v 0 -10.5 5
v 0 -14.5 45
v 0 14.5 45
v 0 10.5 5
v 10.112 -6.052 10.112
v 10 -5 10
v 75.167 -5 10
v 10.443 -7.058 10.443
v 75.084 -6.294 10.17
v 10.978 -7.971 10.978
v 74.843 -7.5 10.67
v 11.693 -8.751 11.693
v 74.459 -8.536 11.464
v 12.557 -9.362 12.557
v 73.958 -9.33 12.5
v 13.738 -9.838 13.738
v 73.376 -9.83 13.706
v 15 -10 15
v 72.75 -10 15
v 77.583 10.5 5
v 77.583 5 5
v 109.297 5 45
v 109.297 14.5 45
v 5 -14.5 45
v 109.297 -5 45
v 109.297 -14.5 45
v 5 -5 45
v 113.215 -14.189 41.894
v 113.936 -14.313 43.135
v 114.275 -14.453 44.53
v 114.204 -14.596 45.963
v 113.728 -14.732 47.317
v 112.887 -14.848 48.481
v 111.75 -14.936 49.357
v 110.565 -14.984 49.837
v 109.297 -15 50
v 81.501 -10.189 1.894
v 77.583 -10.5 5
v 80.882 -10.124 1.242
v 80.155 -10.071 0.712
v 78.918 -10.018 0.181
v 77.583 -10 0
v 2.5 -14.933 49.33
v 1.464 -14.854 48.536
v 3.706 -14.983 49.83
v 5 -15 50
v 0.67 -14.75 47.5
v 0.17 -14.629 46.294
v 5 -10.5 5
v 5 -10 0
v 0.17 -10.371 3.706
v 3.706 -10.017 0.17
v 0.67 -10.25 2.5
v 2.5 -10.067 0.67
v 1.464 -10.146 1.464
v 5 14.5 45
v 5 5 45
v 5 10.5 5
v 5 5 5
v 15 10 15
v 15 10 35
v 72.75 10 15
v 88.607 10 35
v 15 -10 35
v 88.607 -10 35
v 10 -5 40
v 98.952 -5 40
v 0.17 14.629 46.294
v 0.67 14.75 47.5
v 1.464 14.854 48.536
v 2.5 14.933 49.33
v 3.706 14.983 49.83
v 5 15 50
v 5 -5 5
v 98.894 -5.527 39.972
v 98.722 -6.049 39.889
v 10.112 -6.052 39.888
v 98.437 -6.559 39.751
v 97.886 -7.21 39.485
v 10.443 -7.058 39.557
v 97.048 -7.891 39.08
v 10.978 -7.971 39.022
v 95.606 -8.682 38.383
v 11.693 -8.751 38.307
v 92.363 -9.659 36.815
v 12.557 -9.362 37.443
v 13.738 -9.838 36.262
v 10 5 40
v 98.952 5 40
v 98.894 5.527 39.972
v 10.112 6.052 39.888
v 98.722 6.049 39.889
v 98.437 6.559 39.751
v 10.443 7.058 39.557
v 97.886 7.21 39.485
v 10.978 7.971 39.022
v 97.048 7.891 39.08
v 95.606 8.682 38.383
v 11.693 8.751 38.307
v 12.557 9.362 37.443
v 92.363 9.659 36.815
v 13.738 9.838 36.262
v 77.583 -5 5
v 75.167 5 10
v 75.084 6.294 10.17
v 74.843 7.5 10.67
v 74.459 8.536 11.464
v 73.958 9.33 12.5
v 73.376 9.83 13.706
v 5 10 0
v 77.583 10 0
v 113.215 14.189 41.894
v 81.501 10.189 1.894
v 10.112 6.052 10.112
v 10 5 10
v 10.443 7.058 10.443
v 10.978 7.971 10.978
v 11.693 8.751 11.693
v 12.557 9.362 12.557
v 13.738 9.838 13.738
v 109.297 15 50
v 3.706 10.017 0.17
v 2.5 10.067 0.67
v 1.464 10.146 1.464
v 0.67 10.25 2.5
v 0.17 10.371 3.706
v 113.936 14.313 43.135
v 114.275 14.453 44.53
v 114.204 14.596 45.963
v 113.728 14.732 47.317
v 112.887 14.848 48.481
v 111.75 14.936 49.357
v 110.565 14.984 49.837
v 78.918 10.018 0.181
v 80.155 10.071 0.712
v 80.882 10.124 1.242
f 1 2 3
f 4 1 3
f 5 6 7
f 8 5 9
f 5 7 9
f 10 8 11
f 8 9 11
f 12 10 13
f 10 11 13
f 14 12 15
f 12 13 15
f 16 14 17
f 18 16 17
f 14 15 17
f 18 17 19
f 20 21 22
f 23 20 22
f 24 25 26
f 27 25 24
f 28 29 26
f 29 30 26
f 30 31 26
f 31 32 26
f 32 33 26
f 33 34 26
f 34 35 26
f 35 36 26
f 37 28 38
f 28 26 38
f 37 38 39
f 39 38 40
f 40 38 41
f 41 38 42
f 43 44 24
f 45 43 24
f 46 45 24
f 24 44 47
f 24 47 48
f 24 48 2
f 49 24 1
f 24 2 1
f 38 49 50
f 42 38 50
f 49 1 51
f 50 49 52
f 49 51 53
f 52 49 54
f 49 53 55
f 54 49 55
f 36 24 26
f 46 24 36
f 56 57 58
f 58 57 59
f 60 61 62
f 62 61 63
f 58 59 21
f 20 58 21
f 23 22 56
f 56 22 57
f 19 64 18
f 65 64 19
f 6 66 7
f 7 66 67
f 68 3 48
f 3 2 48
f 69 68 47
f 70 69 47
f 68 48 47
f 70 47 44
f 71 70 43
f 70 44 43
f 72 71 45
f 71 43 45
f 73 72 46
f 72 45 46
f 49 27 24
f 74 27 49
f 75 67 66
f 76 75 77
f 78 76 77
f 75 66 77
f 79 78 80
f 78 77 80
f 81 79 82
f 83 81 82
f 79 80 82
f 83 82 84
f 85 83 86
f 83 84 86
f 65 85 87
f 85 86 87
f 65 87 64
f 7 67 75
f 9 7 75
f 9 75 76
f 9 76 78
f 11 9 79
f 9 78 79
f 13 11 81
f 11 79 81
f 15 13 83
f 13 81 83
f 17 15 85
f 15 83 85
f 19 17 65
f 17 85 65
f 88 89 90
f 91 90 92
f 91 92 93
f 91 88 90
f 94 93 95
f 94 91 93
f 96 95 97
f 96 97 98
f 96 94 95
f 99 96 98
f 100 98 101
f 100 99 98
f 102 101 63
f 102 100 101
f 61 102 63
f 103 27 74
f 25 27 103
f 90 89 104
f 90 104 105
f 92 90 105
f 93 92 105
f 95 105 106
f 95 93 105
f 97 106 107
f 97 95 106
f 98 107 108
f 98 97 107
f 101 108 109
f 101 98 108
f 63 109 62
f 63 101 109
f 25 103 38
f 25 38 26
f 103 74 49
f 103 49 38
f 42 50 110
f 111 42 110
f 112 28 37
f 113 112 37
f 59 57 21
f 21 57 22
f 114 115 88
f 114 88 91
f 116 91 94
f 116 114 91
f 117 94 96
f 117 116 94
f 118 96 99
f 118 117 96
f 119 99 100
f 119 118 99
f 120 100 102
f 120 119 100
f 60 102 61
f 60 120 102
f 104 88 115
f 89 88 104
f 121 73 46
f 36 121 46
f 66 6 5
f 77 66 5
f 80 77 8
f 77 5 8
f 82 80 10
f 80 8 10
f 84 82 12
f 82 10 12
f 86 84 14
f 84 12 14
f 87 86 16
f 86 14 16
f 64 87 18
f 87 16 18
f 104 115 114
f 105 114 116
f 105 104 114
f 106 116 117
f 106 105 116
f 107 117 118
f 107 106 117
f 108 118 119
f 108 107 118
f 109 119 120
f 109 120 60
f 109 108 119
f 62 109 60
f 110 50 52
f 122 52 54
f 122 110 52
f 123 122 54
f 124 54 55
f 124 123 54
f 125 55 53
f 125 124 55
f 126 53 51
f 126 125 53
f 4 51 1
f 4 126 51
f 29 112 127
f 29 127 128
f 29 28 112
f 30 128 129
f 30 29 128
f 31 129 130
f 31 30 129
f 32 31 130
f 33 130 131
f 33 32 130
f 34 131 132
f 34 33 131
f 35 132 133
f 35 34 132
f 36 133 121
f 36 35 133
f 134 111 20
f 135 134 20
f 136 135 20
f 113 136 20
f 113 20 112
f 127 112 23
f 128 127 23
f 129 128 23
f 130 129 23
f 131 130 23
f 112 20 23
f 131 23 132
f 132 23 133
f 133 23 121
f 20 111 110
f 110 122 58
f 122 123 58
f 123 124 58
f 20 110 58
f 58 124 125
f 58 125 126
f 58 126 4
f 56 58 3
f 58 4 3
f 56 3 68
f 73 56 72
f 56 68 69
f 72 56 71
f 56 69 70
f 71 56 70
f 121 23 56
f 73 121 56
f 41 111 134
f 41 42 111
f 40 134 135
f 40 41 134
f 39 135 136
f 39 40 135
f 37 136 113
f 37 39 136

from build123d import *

# Parameters (mm, degrees)
F2_DEPTH      = 120
F4_DEPTH      = 15.001
F4_DEPTH_BACK = 15.001
F6_DEPTH      = 25
F8_DEPTH      = 5
F9_R          = 4.99999
F11_R         = 5


# Not quite as in the source:
# - a fillet or chamfer is up to 0.001 mm smaller than in the source, because OpenCascade refuses the exact size
# - a pattern or mirror of a feature is missing from the dataset's text; its kind, count and spacing are read off the source's solid


with BuildPart() as f2:
    # F1 (on Right) → F2 (new body)
    with BuildSketch(Plane.YZ):
        Polygon((-10, 0), (0, 0), (10, 0), (15, 50), (0, 50), (-15, 50), align=None)
    extrude(amount=F2_DEPTH)

    # F3 (on Front) → F4 (cut, two sides)
    with BuildSketch(Plane.XZ) as f4_sk:
        Polygon((120, 50.4512232197), (80, 0), (120, 0), align=None)
    extrude(amount=-F4_DEPTH, mode=Mode.SUBTRACT)
    extrude(f4_sk.sketch, amount=F4_DEPTH_BACK, mode=Mode.SUBTRACT)

    # F5 (on offset) → F6 (cut)
    with BuildSketch(Plane.XZ.offset(5)):
        Polygon((5, 45), (5, 5), (77.5833880732, 5), (109.2971880149, 45), align=None)
    f6 = extrude(amount=F6_DEPTH, mode=Mode.SUBTRACT)

    # F6_copies: F6 across plane
    add(f6.mirror(Plane.ZX), mode=Mode.SUBTRACT)

    # F11
    f11_edges = [f2.edges().sort_by_distance(p)[0] for p in [
        (119.64225, 0, 50),
        (80, 0, 0),
        (0, 0, 0),
        (0, 0, 50),
    ]]
    fillet(f11_edges, radius=F11_R)


with BuildPart() as f8:
    # F7 (on face) → F8 (new body)
    with BuildSketch(Plane.XZ.offset(5)):
        Polygon((10, 40), (10, 10), (75.1667761465, 10), (98.9521261027, 40), align=None)
    extrude(amount=F8_DEPTH)

    # F9 (radius 5 in the source; OpenCascade refuses exactly that, so slightly less here)
    f9_edges = [f8.edges().sort_by_distance(p)[0] for p in [
        (10, -10, 25),
        (42.583388, -10, 10),
        (87.059451, -10, 25),
        (54.476063, -10, 40),
    ]]
    fillet(f9_edges, radius=F9_R)


with BuildPart() as f10_1:
    # F10: instance of F8
    add(f8.part.mirror(Plane.XZ))


solid = Compound([f2.part, f8.part, f10_1.part])
